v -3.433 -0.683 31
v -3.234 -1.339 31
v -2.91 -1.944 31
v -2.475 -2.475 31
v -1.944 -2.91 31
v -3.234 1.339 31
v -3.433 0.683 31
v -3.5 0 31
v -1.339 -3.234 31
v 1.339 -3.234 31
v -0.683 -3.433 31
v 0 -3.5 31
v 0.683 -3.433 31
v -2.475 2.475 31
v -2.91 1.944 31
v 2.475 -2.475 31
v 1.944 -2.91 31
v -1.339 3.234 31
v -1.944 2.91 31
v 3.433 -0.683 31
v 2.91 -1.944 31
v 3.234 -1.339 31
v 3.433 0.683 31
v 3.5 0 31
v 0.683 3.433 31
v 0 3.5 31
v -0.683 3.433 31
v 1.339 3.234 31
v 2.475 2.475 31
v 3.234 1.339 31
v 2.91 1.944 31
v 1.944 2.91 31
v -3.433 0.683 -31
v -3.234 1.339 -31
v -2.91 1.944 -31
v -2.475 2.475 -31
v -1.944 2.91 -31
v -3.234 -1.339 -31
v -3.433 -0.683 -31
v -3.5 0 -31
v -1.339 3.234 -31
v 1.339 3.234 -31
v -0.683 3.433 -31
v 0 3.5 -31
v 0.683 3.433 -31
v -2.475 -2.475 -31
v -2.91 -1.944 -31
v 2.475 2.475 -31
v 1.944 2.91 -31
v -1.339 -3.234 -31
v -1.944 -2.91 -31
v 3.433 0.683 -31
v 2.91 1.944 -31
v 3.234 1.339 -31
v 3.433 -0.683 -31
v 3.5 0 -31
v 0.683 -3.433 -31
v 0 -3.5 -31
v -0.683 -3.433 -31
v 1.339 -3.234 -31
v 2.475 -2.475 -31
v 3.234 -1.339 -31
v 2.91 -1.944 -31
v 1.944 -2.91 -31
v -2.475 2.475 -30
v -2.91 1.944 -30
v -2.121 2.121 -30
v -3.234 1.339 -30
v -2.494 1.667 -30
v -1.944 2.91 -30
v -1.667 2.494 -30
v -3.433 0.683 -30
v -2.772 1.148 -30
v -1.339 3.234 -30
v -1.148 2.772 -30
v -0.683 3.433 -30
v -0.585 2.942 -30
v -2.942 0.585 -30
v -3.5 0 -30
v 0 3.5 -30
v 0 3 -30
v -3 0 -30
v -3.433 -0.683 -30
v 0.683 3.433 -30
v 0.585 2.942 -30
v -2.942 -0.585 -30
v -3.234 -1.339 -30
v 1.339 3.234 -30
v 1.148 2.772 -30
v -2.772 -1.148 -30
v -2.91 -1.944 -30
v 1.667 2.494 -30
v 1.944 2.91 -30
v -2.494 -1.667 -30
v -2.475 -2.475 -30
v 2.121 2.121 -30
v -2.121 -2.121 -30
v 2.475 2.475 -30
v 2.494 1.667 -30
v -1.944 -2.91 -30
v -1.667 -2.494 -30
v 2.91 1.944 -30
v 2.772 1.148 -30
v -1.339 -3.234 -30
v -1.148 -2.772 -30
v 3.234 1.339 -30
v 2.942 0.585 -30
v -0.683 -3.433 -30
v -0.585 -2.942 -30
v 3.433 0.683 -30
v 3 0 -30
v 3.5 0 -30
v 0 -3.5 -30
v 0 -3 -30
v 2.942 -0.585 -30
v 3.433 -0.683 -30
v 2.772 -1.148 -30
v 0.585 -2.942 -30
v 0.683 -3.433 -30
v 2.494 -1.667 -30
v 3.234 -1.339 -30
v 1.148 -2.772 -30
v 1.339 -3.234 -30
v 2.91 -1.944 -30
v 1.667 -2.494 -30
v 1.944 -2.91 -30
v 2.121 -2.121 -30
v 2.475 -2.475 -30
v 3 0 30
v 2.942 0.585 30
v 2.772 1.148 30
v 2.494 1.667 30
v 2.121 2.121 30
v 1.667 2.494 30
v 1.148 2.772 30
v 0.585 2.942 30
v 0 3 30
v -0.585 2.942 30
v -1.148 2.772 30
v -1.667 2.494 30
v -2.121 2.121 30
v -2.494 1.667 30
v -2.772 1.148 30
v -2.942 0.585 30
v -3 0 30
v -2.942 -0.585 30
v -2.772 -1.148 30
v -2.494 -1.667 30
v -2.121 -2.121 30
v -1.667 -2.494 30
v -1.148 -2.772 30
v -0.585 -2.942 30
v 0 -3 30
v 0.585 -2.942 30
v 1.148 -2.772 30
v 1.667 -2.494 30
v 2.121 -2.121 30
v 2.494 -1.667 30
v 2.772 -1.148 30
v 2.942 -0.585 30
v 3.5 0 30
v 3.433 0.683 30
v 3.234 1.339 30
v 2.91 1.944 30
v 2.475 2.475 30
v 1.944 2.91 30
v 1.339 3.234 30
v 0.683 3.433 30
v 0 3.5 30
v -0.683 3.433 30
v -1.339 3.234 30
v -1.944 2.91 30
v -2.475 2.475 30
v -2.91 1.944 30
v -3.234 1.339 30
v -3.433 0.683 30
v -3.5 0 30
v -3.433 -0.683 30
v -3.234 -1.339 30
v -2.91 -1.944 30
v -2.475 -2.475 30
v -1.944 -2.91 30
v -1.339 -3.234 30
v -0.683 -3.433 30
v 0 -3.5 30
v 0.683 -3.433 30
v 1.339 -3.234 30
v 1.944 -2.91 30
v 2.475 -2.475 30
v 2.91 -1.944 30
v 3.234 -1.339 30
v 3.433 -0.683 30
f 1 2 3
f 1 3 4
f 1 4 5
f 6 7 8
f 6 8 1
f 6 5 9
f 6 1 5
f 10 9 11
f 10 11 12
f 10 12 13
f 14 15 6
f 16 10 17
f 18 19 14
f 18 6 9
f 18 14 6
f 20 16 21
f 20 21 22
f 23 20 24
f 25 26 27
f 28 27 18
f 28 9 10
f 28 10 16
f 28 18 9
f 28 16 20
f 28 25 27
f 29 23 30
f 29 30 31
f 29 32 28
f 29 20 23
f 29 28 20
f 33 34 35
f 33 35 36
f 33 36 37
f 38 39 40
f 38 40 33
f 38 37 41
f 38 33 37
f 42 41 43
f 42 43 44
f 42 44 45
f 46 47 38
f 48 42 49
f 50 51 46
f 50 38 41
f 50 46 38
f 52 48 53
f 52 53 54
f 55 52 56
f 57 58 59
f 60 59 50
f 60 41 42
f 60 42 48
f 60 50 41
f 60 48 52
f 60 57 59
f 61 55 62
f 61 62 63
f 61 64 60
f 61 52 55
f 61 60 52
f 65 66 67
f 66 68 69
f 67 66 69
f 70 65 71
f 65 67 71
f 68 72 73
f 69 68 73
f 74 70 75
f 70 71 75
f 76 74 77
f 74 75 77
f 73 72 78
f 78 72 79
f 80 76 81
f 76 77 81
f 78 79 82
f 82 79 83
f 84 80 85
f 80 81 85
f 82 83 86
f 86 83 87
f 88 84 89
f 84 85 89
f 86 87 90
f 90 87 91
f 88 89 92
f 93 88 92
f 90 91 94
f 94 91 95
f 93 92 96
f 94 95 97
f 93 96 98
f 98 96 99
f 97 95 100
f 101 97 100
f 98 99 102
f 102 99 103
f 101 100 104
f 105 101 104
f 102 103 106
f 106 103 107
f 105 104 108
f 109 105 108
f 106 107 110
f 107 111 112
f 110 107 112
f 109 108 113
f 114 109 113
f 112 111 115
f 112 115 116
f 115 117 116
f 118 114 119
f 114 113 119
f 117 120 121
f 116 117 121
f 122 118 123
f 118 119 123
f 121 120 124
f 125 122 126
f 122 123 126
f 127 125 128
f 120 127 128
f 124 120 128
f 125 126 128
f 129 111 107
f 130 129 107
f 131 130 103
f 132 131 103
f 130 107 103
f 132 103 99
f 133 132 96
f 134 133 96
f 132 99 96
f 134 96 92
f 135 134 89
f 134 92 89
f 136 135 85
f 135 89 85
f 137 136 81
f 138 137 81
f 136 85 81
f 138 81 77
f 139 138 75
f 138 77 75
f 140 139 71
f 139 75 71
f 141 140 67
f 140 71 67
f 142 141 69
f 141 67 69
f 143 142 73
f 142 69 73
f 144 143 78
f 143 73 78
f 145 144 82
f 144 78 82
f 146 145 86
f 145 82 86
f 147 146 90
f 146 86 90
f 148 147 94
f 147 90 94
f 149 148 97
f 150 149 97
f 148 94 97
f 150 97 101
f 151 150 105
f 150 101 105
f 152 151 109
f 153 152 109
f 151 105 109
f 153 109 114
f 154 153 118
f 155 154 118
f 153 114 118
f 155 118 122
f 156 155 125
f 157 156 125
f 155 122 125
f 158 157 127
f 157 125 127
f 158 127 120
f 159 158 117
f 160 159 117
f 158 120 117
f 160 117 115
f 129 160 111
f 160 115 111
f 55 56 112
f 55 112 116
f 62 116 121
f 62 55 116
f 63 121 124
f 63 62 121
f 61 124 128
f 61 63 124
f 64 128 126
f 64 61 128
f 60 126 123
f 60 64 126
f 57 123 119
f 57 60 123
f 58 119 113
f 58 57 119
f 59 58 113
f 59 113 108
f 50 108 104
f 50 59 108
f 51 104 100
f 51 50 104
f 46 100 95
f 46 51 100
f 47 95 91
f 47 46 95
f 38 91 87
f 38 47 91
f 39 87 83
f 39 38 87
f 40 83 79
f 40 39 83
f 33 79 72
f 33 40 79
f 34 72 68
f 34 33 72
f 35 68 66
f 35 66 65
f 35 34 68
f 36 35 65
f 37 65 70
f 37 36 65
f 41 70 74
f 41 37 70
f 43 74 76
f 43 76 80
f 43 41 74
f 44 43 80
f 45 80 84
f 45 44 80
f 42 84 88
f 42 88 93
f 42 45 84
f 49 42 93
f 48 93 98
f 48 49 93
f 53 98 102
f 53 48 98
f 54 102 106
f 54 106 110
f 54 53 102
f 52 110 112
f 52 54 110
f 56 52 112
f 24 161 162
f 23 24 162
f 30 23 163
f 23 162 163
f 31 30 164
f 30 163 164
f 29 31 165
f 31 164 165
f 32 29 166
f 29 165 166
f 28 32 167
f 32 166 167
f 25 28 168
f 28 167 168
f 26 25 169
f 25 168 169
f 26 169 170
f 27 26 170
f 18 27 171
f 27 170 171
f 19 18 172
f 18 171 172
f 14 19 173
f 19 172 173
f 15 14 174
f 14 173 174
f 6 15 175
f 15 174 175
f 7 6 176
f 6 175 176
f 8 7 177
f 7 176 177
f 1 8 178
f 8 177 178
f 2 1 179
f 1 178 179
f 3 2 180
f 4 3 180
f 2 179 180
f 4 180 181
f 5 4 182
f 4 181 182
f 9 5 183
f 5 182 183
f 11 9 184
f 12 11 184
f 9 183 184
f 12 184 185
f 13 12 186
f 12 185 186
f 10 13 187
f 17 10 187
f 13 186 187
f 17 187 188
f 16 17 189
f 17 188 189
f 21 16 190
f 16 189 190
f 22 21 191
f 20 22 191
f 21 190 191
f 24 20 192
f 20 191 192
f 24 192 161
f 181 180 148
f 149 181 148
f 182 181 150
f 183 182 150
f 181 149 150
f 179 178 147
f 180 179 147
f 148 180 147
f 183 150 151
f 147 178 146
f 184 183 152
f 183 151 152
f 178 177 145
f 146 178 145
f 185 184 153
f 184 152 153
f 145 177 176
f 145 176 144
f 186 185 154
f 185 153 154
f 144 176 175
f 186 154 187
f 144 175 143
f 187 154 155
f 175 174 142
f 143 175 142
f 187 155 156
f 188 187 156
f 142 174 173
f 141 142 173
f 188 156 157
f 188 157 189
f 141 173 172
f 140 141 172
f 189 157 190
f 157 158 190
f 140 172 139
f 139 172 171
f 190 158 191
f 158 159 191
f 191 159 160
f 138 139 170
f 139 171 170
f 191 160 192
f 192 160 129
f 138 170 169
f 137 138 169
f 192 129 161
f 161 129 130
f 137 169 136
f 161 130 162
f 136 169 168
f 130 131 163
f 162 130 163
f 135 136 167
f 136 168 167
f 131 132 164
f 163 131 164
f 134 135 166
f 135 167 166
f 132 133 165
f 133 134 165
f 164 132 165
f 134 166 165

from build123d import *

# Parameters (mm, degrees)
BOSS_EXTRUDE1_DEPTH      = 30
BOSS_EXTRUDE1_DEPTH_BACK = 30
SKETCH1_R                = 3
SKETCH2_R                = 3.5
BOSS_EXTRUDE2_DEPTH      = 1
BOSS_EXTRUDE3_START      = 1
SKETCH3_R                = 3.5
BOSS_EXTRUDE3_DEPTH      = 1


with BuildPart() as part:
    # Sketch1 → Boss-Extrude1 (new, two sides: drawn at the far end of the back side and taken through both)
    with BuildSketch(Plane.XY.offset(-BOSS_EXTRUDE1_DEPTH_BACK)):
        Circle(SKETCH1_R)
    extrude(amount=BOSS_EXTRUDE1_DEPTH + BOSS_EXTRUDE1_DEPTH_BACK)

    # Sketch2 → Boss-Extrude2 (add)
    with BuildSketch(Plane.XY.offset(30)):
        Circle(SKETCH2_R)
    extrude(amount=BOSS_EXTRUDE2_DEPTH)

    # Sketch3 → Boss-Extrude3 (add)
    with BuildSketch(Plane(origin=(0, 0, -30), x_dir=(-1, 0, 0), z_dir=(0, 0, -1)).offset(BOSS_EXTRUDE3_START)):
        Circle(SKETCH3_R)
    extrude(amount=-BOSS_EXTRUDE3_DEPTH)


solid = part.part
